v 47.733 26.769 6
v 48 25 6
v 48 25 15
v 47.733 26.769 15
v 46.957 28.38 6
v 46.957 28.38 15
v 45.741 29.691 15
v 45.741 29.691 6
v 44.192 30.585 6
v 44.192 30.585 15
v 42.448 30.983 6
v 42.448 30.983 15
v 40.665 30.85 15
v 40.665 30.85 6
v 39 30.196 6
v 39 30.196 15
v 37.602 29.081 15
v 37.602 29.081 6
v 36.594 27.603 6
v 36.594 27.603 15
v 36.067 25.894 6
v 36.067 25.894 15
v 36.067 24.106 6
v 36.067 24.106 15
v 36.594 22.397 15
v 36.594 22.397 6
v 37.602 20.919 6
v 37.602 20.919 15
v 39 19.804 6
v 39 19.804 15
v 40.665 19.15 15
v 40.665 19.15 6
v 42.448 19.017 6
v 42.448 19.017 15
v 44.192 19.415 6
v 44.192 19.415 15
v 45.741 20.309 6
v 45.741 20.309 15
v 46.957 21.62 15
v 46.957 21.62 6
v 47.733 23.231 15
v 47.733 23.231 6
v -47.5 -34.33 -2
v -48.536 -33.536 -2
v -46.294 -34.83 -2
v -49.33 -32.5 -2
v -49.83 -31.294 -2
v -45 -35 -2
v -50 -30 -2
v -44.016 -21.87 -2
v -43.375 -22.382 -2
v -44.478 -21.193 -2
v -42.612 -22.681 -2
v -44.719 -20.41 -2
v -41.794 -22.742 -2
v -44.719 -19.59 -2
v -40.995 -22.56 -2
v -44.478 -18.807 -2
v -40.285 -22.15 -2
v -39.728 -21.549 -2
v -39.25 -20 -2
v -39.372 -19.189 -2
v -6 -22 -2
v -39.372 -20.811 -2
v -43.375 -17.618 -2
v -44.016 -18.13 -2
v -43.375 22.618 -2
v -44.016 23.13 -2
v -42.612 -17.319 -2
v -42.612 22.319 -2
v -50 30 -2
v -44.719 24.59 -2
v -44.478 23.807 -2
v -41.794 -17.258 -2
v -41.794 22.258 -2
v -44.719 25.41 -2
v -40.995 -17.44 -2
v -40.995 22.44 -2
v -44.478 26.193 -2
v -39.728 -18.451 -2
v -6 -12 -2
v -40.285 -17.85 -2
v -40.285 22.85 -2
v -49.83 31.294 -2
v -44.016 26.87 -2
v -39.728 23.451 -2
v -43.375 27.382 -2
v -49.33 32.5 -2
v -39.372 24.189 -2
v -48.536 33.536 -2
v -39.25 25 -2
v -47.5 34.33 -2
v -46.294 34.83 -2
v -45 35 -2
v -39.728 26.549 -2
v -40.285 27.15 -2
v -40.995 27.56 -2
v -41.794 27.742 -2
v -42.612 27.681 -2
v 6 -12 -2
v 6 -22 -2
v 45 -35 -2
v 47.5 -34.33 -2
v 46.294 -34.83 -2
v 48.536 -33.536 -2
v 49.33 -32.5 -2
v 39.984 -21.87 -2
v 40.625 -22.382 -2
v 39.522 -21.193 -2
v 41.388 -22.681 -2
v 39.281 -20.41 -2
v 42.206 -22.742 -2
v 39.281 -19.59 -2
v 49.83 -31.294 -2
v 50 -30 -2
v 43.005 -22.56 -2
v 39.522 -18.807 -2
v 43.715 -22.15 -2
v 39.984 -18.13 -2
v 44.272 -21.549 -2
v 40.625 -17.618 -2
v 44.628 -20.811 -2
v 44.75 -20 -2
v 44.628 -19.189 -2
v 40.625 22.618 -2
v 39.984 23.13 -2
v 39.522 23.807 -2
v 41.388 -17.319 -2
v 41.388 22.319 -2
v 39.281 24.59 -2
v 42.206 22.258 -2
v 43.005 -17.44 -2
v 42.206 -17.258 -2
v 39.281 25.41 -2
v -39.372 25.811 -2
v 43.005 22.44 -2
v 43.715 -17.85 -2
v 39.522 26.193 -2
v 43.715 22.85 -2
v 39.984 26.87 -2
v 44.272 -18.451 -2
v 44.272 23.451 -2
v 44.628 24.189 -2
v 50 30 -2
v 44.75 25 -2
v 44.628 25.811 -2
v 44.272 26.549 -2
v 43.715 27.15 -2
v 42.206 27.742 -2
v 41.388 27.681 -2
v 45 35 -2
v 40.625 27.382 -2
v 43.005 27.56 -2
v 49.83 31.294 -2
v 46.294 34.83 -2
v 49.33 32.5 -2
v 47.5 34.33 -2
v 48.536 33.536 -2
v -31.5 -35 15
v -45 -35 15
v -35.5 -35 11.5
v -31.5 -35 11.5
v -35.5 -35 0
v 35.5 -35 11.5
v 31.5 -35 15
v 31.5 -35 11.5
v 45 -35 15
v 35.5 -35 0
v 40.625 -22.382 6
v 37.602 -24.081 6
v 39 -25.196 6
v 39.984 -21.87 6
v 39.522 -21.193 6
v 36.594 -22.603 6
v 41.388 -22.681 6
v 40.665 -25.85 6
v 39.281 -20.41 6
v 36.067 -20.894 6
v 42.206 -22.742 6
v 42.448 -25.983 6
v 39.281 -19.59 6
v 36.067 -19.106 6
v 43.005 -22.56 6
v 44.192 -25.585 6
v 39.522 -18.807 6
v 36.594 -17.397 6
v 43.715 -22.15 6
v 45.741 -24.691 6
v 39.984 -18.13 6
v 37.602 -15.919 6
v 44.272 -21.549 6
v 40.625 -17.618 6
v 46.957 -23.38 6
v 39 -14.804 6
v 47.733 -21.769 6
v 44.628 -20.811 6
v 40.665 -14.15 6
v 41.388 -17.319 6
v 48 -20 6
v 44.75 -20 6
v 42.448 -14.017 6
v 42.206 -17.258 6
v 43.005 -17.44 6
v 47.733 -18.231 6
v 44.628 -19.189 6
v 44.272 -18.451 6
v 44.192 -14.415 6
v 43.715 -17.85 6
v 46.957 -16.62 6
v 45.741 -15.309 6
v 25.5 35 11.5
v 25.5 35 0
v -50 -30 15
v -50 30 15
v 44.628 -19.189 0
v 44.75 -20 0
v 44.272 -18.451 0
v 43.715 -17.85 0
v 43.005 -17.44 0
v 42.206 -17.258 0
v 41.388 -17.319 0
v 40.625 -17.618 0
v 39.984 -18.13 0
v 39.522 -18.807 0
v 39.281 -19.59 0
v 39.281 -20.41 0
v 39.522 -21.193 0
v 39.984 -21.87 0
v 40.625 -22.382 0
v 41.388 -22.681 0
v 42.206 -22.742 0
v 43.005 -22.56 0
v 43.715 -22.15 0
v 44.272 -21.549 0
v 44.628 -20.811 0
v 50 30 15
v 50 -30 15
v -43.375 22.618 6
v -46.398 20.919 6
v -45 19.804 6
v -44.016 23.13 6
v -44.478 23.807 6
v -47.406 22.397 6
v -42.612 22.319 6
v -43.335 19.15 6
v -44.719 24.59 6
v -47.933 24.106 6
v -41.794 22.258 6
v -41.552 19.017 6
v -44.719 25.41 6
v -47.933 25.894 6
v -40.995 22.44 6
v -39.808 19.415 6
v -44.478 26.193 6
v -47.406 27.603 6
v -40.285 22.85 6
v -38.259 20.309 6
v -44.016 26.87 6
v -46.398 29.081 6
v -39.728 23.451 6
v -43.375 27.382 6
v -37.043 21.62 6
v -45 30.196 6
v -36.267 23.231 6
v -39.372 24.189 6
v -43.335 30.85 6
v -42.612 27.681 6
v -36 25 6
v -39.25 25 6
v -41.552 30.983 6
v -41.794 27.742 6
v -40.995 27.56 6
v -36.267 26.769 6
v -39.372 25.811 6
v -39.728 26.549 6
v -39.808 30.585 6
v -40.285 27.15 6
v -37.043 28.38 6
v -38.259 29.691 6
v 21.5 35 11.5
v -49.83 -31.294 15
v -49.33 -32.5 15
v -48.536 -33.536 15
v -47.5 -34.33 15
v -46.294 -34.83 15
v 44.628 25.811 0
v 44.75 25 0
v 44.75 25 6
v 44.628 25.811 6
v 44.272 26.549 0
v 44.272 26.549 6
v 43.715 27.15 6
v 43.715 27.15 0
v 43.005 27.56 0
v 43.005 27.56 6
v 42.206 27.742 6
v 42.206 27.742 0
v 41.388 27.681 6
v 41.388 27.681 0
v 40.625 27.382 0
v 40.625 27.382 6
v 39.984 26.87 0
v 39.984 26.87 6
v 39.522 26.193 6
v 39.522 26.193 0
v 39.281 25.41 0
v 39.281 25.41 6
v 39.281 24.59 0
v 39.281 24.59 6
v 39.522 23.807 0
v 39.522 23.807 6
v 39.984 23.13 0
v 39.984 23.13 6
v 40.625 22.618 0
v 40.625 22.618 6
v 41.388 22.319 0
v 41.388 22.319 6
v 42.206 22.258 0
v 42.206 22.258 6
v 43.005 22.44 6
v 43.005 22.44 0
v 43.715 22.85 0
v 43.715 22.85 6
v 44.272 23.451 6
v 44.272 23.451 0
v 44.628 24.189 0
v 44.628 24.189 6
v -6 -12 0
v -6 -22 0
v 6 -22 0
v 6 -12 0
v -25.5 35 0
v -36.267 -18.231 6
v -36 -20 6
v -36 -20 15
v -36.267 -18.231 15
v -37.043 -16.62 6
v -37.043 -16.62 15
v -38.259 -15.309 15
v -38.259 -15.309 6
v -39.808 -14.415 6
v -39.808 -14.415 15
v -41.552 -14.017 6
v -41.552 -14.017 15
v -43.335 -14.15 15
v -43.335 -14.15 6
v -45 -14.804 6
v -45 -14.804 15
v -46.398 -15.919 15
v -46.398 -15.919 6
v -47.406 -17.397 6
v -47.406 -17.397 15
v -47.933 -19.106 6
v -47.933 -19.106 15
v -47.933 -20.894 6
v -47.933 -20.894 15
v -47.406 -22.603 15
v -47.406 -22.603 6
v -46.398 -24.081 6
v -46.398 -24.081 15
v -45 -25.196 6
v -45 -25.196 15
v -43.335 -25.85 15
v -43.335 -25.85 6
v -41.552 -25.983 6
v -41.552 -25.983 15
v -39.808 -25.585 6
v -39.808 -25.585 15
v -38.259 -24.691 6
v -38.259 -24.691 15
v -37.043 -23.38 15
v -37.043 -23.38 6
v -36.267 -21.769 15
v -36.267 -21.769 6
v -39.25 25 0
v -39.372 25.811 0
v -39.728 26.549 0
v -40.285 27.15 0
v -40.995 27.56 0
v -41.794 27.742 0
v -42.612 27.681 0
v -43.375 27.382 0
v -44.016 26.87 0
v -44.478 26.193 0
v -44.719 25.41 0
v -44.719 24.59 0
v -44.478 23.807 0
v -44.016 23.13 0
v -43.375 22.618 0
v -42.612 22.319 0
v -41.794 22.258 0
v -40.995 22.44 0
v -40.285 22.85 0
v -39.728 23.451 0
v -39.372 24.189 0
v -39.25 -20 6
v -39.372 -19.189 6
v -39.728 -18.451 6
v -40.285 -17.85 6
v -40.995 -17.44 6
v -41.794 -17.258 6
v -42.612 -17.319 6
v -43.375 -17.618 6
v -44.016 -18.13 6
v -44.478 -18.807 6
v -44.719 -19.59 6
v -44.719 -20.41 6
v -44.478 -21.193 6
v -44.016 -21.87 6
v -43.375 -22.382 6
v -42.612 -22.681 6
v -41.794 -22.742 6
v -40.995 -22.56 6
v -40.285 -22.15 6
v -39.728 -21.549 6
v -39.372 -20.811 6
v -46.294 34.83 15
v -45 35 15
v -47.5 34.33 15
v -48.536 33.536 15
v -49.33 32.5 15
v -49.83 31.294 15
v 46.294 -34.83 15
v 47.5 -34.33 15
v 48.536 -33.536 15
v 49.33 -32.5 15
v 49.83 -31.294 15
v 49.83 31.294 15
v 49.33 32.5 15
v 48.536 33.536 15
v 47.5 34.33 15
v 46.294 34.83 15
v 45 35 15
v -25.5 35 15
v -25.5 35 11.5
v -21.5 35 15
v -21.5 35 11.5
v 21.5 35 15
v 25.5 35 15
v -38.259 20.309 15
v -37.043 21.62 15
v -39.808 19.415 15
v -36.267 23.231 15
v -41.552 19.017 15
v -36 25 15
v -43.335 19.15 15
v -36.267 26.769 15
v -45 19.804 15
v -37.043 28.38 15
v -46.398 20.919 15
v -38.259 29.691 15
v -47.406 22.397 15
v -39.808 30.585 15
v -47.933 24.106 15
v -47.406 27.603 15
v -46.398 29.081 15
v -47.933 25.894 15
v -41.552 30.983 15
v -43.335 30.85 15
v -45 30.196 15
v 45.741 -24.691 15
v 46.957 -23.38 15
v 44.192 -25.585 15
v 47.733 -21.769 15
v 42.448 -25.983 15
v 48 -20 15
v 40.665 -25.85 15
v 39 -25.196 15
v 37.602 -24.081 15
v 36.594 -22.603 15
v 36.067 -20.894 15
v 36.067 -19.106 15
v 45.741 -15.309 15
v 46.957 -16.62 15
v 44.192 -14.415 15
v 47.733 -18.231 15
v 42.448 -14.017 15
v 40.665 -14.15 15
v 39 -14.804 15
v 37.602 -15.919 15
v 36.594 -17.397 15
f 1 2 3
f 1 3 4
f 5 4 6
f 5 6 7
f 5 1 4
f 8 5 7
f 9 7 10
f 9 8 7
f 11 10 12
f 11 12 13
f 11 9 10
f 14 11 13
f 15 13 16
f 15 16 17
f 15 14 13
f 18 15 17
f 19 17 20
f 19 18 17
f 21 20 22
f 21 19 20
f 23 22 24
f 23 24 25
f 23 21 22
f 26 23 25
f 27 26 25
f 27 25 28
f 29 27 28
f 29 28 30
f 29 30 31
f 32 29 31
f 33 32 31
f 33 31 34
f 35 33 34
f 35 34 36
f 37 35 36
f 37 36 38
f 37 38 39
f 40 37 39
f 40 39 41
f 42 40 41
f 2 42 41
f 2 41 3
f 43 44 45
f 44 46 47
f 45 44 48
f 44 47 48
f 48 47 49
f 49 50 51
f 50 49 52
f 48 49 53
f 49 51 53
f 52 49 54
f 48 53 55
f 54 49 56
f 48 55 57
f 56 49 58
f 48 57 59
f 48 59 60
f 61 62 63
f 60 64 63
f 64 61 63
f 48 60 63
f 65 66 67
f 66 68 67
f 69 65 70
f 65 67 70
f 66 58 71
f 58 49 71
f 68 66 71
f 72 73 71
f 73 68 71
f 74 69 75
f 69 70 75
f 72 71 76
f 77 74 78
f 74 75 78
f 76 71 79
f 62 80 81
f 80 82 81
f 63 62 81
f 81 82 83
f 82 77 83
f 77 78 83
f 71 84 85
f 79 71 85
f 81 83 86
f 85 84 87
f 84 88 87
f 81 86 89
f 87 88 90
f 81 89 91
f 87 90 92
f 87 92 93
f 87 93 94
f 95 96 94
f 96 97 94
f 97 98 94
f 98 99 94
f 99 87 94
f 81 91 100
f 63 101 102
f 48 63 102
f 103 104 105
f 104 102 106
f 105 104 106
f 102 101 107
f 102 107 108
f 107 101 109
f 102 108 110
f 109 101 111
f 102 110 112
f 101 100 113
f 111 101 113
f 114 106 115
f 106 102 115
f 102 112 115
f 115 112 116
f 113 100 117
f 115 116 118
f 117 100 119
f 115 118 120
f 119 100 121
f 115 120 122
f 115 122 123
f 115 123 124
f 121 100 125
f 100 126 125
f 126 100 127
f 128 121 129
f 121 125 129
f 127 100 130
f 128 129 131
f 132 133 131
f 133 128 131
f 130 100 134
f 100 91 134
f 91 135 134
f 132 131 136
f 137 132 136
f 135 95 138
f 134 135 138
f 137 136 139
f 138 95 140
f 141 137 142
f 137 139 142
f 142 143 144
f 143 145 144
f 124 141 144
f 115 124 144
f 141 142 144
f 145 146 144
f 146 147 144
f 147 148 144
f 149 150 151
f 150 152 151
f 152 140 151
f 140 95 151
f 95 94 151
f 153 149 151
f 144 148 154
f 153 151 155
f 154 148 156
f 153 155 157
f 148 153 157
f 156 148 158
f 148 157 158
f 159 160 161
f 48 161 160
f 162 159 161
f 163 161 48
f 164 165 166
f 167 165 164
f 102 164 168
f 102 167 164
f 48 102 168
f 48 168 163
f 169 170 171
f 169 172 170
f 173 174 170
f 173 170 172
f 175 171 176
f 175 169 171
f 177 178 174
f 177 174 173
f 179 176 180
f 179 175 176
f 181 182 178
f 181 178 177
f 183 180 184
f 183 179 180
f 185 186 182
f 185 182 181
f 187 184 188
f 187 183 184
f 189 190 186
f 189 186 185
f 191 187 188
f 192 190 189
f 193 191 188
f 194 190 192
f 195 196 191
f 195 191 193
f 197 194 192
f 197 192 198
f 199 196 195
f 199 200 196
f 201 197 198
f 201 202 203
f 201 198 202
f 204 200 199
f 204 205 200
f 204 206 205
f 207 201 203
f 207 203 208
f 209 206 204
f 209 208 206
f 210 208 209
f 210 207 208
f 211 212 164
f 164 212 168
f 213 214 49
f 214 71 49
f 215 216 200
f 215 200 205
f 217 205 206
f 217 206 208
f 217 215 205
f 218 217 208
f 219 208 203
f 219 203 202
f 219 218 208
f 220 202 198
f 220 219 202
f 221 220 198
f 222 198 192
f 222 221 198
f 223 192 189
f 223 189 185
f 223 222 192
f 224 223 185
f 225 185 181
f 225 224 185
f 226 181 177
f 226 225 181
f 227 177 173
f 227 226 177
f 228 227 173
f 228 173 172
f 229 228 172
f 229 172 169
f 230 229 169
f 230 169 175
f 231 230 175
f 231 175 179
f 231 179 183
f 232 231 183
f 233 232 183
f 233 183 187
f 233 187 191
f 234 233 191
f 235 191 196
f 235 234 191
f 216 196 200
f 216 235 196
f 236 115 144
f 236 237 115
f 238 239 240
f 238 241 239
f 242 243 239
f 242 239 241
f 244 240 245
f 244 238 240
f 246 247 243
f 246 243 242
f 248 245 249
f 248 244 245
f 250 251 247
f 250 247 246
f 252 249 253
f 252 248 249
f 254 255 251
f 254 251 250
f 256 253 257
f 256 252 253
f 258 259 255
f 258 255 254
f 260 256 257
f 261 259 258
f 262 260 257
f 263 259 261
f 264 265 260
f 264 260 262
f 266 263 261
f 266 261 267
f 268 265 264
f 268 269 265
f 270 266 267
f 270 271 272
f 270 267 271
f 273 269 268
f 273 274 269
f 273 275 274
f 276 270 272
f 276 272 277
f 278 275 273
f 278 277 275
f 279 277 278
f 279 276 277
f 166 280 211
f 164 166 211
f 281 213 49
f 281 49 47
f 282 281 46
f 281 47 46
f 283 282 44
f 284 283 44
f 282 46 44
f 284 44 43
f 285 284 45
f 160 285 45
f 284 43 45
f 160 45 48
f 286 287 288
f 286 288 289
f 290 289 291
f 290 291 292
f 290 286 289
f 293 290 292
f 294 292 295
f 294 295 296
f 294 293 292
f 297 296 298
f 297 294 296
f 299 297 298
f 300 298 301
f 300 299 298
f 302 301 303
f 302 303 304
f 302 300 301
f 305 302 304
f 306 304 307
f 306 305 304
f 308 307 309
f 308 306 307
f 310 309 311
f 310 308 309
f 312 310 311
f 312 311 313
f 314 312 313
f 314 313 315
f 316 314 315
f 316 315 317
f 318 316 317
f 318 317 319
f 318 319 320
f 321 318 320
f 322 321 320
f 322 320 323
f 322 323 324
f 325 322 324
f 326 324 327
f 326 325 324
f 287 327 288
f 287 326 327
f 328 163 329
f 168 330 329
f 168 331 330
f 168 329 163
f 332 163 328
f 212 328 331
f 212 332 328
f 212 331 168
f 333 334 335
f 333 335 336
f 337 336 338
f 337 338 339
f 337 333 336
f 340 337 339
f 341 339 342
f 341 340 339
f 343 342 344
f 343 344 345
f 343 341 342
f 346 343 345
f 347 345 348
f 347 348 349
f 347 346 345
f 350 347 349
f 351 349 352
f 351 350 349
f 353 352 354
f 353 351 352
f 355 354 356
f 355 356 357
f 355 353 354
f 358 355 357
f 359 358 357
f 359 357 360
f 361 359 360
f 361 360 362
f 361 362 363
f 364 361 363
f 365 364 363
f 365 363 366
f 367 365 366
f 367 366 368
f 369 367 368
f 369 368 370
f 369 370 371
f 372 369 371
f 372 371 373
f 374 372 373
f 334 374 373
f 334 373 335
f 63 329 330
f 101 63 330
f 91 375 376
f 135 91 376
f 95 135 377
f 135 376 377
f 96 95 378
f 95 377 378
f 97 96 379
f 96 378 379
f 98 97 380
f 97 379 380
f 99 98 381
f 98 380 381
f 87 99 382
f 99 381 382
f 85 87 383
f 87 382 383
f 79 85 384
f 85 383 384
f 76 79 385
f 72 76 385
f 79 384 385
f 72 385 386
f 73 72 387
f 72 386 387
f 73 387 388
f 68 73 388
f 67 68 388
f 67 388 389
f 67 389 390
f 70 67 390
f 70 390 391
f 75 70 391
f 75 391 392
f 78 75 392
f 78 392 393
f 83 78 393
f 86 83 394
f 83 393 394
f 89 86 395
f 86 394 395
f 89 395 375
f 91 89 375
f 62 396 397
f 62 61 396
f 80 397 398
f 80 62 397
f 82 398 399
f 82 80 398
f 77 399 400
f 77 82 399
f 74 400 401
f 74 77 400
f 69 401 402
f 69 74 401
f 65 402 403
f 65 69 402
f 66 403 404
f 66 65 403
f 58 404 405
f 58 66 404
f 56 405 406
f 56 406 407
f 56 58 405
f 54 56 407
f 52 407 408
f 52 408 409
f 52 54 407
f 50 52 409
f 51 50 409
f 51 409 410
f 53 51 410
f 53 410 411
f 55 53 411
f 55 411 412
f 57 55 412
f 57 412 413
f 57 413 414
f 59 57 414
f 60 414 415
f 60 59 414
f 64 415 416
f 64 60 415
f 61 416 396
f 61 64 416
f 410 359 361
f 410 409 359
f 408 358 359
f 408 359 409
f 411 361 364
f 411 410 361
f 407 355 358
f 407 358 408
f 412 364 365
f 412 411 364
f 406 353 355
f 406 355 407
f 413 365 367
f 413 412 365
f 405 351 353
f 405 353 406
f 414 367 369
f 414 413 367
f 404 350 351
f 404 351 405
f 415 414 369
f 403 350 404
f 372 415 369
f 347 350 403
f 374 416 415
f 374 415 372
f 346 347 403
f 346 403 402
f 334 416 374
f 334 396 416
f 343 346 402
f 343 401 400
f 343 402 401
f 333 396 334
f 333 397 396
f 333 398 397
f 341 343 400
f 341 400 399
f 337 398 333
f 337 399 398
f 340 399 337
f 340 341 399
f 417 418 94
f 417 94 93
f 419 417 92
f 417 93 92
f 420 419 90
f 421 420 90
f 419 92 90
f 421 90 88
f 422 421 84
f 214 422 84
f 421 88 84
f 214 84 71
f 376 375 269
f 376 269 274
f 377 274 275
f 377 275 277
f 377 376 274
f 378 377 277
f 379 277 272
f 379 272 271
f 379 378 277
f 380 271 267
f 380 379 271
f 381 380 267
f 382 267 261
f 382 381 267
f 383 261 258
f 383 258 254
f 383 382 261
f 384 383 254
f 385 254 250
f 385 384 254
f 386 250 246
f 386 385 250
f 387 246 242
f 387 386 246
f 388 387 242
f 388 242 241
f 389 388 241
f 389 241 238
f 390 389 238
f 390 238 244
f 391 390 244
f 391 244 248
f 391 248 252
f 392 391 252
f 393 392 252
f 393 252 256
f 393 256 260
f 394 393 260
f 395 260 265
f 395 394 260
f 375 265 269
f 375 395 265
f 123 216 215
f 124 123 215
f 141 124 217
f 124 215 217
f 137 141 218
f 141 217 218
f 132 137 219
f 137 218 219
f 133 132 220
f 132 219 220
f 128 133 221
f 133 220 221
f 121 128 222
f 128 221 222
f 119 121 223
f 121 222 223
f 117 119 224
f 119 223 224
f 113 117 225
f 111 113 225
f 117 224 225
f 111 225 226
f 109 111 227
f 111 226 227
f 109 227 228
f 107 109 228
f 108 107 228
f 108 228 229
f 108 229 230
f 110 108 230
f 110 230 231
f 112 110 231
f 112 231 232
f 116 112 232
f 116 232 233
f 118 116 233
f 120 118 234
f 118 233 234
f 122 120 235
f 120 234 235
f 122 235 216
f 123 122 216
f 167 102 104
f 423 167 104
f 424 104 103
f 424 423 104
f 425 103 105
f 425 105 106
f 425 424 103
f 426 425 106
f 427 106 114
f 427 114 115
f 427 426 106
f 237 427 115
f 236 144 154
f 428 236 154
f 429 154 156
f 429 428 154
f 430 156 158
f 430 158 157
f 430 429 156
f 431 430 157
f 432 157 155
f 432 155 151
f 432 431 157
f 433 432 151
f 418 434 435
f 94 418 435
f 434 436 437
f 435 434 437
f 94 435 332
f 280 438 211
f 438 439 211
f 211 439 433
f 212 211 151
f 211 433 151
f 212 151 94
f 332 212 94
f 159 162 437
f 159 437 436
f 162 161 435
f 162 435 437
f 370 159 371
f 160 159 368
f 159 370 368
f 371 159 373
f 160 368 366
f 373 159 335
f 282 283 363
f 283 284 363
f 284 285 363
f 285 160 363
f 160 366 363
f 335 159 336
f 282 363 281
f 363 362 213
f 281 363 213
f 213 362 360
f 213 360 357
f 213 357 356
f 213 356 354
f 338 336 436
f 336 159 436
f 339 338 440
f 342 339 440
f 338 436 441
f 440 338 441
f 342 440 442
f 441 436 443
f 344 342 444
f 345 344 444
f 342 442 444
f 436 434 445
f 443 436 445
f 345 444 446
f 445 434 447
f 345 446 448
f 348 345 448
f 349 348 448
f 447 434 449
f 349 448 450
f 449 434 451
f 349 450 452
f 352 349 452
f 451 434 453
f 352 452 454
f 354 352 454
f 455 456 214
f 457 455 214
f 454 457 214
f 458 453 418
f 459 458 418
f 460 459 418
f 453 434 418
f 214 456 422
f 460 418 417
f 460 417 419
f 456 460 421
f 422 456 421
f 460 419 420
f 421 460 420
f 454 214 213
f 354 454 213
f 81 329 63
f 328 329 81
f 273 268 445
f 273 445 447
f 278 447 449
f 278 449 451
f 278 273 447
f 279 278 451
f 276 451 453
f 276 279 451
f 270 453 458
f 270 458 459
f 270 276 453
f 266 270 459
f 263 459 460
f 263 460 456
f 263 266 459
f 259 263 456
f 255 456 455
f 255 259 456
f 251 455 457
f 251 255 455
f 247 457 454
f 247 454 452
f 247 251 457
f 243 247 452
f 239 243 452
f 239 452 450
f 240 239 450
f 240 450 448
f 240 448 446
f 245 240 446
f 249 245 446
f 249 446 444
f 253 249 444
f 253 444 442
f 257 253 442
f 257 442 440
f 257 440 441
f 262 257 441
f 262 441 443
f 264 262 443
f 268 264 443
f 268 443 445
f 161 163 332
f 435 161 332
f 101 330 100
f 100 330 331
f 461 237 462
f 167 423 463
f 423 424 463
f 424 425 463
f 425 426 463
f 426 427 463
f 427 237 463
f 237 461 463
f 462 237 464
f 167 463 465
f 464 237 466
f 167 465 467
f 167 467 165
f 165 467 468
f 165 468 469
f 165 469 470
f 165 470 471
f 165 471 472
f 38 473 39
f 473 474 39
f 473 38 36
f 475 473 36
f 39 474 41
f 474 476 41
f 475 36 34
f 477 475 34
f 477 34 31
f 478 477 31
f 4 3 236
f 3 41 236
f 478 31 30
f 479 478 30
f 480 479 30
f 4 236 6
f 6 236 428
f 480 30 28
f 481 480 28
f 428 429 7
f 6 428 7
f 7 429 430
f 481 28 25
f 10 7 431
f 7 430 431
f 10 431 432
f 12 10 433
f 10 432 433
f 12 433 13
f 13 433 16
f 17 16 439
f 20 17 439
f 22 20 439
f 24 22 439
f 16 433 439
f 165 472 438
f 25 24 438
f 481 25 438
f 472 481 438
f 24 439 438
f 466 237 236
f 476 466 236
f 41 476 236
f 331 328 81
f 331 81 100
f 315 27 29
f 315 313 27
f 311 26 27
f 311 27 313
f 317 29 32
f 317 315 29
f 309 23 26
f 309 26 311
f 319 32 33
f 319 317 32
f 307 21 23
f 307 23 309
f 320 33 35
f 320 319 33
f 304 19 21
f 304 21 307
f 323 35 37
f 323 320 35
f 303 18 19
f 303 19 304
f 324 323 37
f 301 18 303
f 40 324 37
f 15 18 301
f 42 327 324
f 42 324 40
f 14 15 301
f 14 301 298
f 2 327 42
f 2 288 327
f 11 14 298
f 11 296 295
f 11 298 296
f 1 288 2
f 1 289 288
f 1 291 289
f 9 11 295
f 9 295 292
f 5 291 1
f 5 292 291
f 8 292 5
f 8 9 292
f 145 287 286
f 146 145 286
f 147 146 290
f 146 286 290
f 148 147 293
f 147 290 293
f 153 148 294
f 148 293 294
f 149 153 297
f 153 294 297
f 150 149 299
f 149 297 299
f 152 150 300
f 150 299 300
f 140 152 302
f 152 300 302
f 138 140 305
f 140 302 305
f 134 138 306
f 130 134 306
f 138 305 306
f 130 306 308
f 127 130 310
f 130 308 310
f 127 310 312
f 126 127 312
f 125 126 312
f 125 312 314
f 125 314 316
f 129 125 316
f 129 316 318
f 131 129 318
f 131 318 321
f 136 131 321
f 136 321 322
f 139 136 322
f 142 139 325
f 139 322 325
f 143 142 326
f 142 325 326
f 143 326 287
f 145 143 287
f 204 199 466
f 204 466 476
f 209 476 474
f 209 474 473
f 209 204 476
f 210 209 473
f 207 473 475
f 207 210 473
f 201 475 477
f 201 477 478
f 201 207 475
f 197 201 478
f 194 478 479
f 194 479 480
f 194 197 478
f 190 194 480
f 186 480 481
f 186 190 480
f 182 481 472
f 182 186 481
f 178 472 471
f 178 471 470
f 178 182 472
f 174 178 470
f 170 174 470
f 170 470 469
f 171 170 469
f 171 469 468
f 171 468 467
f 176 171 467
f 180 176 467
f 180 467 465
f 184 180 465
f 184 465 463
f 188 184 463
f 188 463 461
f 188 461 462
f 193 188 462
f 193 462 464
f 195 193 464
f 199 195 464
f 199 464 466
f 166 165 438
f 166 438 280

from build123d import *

# Parameters (mm, degrees)
F0_R     = 6
F0_W     = 12
F0_H     = 10
F0_R_2   = 2.75
F1_DEPTH = 2
F2_DEPTH = 15
F3_W     = 4
F3_H     = 3.5
F6_DEPTH = 6


with BuildPart() as f1:
    # F0 (on Top) → F1 (new body)
    with BuildSketch(Plane.XY):
        with BuildLine():
            Line((-25.5, 35), (-45, 35))
            ThreePointArc((-45, 35), (-48.5355339059, 33.5355339059), (-50, 30))
            Line((-50, 30), (-50, -30))
            ThreePointArc((-50, -30), (-48.5355339059, -33.5355339059), (-45, -35))
            Line((-45, -35), (-35.5, -35))
            Line((-35.5, -35), (-25.5, 35))
        make_face()
        with Locations((-42, -20)):
            Circle(F0_R, mode=Mode.SUBTRACT)
        with Locations((-42, 25)):
            Circle(F0_R, mode=Mode.SUBTRACT)
        Polygon((25.5, 35), (-25.5, 35), (-35.5, -35), (35.5, -35), align=None)
        with Locations((0, -17)):
            Rectangle(F0_W, F0_H, mode=Mode.SUBTRACT)
        with BuildLine():
            Line((45, 35), (25.5, 35))
            Line((25.5, 35), (35.5, -35))
            Line((35.5, -35), (45, -35))
            ThreePointArc((45, -35), (48.5355339059, -33.5355339059), (50, -30))
            Line((50, -30), (50, 30))
            ThreePointArc((50, 30), (48.5355339059, 33.5355339059), (45, 35))
        make_face()
        with Locations((42, -20)):
            Circle(F0_R, mode=Mode.SUBTRACT)
        with Locations((42, 25)):
            Circle(F0_R, mode=Mode.SUBTRACT)
        with Locations((-42, 25)):
            Circle(F0_R)
        with Locations((-42, 25)):
            Circle(F0_R_2, mode=Mode.SUBTRACT)
        with Locations((-42, -20)):
            Circle(F0_R)
        with Locations((-42, -20)):
            Circle(F0_R_2, mode=Mode.SUBTRACT)
        with Locations((42, -20)):
            Circle(F0_R)
        with Locations((42, -20)):
            Circle(F0_R_2, mode=Mode.SUBTRACT)
        with Locations((42, 25)):
            Circle(F0_R)
        with Locations((42, 25)):
            Circle(F0_R_2, mode=Mode.SUBTRACT)
    extrude(amount=-F1_DEPTH)

    # F0 (on Top) → F2 (join)
    with BuildSketch(Plane.XY):
        with BuildLine():
            Line((-25.5, 35), (-45, 35))
            ThreePointArc((-45, 35), (-48.5355339059, 33.5355339059), (-50, 30))
            Line((-50, 30), (-50, -30))
            ThreePointArc((-50, -30), (-48.5355339059, -33.5355339059), (-45, -35))
            Line((-45, -35), (-35.5, -35))
            Line((-35.5, -35), (-25.5, 35))
        make_face()
        with Locations((-42, -20)):
            Circle(F0_R, mode=Mode.SUBTRACT)
        with Locations((-42, 25)):
            Circle(F0_R, mode=Mode.SUBTRACT)
        with BuildLine():
            Line((45, 35), (25.5, 35))
            Line((25.5, 35), (35.5, -35))
            Line((35.5, -35), (45, -35))
            ThreePointArc((45, -35), (48.5355339059, -33.5355339059), (50, -30))
            Line((50, -30), (50, 30))
            ThreePointArc((50, 30), (48.5355339059, 33.5355339059), (45, 35))
        make_face()
        with Locations((42, -20)):
            Circle(F0_R, mode=Mode.SUBTRACT)
        with Locations((42, 25)):
            Circle(F0_R, mode=Mode.SUBTRACT)
    extrude(amount=F2_DEPTH)

    # F4: sweep along a path in F4_path
    with BuildLine(Plane(origin=(-35.5, -35, 15), x_dir=(-0.1414213562, -0.9899494937, 0), z_dir=(0.9899494937, -0.1414213562, 0))) as f4_path:
        Line((0, 0), (-70.7106781187, 0))
    # F3 (on face) → F4 (sweep)
    with BuildSketch(Plane.XZ.offset(35)):
        with Locations((-33.5, 13.25)):
            Rectangle(F3_W, F3_H)
    sweep(path=f4_path.line)

    # F5: sweep along a path in F5_path
    with BuildLine(Plane(origin=(35.5, -35, 15), x_dir=(0.1414213562, -0.9899494937, 0), z_dir=(0.9899494937, 0.1414213562, 0))) as f5_path:
        Line((0, 0), (-70.7106781187, 0))
    # F3 (on face) → F5 (sweep)
    with BuildSketch(Plane.XZ.offset(35)):
        with Locations((33.5, 13.25)):
            Rectangle(F3_W, F3_H)
    sweep(path=f5_path.line)

    # F0 (on Top) → F6 (join)
    with BuildSketch(Plane.XY):
        with Locations((-42, -20)):
            Circle(F0_R)
        with Locations((-42, -20)):
            Circle(F0_R_2, mode=Mode.SUBTRACT)
        with Locations((-42, 25)):
            Circle(F0_R)
        with Locations((-42, 25)):
            Circle(F0_R_2, mode=Mode.SUBTRACT)
        with Locations((42, 25)):
            Circle(F0_R)
        with Locations((42, 25)):
            Circle(F0_R_2, mode=Mode.SUBTRACT)
        with Locations((42, -20)):
            Circle(F0_R)
        with Locations((42, -20)):
            Circle(F0_R_2, mode=Mode.SUBTRACT)
    extrude(amount=F6_DEPTH)


solid = f1.part
